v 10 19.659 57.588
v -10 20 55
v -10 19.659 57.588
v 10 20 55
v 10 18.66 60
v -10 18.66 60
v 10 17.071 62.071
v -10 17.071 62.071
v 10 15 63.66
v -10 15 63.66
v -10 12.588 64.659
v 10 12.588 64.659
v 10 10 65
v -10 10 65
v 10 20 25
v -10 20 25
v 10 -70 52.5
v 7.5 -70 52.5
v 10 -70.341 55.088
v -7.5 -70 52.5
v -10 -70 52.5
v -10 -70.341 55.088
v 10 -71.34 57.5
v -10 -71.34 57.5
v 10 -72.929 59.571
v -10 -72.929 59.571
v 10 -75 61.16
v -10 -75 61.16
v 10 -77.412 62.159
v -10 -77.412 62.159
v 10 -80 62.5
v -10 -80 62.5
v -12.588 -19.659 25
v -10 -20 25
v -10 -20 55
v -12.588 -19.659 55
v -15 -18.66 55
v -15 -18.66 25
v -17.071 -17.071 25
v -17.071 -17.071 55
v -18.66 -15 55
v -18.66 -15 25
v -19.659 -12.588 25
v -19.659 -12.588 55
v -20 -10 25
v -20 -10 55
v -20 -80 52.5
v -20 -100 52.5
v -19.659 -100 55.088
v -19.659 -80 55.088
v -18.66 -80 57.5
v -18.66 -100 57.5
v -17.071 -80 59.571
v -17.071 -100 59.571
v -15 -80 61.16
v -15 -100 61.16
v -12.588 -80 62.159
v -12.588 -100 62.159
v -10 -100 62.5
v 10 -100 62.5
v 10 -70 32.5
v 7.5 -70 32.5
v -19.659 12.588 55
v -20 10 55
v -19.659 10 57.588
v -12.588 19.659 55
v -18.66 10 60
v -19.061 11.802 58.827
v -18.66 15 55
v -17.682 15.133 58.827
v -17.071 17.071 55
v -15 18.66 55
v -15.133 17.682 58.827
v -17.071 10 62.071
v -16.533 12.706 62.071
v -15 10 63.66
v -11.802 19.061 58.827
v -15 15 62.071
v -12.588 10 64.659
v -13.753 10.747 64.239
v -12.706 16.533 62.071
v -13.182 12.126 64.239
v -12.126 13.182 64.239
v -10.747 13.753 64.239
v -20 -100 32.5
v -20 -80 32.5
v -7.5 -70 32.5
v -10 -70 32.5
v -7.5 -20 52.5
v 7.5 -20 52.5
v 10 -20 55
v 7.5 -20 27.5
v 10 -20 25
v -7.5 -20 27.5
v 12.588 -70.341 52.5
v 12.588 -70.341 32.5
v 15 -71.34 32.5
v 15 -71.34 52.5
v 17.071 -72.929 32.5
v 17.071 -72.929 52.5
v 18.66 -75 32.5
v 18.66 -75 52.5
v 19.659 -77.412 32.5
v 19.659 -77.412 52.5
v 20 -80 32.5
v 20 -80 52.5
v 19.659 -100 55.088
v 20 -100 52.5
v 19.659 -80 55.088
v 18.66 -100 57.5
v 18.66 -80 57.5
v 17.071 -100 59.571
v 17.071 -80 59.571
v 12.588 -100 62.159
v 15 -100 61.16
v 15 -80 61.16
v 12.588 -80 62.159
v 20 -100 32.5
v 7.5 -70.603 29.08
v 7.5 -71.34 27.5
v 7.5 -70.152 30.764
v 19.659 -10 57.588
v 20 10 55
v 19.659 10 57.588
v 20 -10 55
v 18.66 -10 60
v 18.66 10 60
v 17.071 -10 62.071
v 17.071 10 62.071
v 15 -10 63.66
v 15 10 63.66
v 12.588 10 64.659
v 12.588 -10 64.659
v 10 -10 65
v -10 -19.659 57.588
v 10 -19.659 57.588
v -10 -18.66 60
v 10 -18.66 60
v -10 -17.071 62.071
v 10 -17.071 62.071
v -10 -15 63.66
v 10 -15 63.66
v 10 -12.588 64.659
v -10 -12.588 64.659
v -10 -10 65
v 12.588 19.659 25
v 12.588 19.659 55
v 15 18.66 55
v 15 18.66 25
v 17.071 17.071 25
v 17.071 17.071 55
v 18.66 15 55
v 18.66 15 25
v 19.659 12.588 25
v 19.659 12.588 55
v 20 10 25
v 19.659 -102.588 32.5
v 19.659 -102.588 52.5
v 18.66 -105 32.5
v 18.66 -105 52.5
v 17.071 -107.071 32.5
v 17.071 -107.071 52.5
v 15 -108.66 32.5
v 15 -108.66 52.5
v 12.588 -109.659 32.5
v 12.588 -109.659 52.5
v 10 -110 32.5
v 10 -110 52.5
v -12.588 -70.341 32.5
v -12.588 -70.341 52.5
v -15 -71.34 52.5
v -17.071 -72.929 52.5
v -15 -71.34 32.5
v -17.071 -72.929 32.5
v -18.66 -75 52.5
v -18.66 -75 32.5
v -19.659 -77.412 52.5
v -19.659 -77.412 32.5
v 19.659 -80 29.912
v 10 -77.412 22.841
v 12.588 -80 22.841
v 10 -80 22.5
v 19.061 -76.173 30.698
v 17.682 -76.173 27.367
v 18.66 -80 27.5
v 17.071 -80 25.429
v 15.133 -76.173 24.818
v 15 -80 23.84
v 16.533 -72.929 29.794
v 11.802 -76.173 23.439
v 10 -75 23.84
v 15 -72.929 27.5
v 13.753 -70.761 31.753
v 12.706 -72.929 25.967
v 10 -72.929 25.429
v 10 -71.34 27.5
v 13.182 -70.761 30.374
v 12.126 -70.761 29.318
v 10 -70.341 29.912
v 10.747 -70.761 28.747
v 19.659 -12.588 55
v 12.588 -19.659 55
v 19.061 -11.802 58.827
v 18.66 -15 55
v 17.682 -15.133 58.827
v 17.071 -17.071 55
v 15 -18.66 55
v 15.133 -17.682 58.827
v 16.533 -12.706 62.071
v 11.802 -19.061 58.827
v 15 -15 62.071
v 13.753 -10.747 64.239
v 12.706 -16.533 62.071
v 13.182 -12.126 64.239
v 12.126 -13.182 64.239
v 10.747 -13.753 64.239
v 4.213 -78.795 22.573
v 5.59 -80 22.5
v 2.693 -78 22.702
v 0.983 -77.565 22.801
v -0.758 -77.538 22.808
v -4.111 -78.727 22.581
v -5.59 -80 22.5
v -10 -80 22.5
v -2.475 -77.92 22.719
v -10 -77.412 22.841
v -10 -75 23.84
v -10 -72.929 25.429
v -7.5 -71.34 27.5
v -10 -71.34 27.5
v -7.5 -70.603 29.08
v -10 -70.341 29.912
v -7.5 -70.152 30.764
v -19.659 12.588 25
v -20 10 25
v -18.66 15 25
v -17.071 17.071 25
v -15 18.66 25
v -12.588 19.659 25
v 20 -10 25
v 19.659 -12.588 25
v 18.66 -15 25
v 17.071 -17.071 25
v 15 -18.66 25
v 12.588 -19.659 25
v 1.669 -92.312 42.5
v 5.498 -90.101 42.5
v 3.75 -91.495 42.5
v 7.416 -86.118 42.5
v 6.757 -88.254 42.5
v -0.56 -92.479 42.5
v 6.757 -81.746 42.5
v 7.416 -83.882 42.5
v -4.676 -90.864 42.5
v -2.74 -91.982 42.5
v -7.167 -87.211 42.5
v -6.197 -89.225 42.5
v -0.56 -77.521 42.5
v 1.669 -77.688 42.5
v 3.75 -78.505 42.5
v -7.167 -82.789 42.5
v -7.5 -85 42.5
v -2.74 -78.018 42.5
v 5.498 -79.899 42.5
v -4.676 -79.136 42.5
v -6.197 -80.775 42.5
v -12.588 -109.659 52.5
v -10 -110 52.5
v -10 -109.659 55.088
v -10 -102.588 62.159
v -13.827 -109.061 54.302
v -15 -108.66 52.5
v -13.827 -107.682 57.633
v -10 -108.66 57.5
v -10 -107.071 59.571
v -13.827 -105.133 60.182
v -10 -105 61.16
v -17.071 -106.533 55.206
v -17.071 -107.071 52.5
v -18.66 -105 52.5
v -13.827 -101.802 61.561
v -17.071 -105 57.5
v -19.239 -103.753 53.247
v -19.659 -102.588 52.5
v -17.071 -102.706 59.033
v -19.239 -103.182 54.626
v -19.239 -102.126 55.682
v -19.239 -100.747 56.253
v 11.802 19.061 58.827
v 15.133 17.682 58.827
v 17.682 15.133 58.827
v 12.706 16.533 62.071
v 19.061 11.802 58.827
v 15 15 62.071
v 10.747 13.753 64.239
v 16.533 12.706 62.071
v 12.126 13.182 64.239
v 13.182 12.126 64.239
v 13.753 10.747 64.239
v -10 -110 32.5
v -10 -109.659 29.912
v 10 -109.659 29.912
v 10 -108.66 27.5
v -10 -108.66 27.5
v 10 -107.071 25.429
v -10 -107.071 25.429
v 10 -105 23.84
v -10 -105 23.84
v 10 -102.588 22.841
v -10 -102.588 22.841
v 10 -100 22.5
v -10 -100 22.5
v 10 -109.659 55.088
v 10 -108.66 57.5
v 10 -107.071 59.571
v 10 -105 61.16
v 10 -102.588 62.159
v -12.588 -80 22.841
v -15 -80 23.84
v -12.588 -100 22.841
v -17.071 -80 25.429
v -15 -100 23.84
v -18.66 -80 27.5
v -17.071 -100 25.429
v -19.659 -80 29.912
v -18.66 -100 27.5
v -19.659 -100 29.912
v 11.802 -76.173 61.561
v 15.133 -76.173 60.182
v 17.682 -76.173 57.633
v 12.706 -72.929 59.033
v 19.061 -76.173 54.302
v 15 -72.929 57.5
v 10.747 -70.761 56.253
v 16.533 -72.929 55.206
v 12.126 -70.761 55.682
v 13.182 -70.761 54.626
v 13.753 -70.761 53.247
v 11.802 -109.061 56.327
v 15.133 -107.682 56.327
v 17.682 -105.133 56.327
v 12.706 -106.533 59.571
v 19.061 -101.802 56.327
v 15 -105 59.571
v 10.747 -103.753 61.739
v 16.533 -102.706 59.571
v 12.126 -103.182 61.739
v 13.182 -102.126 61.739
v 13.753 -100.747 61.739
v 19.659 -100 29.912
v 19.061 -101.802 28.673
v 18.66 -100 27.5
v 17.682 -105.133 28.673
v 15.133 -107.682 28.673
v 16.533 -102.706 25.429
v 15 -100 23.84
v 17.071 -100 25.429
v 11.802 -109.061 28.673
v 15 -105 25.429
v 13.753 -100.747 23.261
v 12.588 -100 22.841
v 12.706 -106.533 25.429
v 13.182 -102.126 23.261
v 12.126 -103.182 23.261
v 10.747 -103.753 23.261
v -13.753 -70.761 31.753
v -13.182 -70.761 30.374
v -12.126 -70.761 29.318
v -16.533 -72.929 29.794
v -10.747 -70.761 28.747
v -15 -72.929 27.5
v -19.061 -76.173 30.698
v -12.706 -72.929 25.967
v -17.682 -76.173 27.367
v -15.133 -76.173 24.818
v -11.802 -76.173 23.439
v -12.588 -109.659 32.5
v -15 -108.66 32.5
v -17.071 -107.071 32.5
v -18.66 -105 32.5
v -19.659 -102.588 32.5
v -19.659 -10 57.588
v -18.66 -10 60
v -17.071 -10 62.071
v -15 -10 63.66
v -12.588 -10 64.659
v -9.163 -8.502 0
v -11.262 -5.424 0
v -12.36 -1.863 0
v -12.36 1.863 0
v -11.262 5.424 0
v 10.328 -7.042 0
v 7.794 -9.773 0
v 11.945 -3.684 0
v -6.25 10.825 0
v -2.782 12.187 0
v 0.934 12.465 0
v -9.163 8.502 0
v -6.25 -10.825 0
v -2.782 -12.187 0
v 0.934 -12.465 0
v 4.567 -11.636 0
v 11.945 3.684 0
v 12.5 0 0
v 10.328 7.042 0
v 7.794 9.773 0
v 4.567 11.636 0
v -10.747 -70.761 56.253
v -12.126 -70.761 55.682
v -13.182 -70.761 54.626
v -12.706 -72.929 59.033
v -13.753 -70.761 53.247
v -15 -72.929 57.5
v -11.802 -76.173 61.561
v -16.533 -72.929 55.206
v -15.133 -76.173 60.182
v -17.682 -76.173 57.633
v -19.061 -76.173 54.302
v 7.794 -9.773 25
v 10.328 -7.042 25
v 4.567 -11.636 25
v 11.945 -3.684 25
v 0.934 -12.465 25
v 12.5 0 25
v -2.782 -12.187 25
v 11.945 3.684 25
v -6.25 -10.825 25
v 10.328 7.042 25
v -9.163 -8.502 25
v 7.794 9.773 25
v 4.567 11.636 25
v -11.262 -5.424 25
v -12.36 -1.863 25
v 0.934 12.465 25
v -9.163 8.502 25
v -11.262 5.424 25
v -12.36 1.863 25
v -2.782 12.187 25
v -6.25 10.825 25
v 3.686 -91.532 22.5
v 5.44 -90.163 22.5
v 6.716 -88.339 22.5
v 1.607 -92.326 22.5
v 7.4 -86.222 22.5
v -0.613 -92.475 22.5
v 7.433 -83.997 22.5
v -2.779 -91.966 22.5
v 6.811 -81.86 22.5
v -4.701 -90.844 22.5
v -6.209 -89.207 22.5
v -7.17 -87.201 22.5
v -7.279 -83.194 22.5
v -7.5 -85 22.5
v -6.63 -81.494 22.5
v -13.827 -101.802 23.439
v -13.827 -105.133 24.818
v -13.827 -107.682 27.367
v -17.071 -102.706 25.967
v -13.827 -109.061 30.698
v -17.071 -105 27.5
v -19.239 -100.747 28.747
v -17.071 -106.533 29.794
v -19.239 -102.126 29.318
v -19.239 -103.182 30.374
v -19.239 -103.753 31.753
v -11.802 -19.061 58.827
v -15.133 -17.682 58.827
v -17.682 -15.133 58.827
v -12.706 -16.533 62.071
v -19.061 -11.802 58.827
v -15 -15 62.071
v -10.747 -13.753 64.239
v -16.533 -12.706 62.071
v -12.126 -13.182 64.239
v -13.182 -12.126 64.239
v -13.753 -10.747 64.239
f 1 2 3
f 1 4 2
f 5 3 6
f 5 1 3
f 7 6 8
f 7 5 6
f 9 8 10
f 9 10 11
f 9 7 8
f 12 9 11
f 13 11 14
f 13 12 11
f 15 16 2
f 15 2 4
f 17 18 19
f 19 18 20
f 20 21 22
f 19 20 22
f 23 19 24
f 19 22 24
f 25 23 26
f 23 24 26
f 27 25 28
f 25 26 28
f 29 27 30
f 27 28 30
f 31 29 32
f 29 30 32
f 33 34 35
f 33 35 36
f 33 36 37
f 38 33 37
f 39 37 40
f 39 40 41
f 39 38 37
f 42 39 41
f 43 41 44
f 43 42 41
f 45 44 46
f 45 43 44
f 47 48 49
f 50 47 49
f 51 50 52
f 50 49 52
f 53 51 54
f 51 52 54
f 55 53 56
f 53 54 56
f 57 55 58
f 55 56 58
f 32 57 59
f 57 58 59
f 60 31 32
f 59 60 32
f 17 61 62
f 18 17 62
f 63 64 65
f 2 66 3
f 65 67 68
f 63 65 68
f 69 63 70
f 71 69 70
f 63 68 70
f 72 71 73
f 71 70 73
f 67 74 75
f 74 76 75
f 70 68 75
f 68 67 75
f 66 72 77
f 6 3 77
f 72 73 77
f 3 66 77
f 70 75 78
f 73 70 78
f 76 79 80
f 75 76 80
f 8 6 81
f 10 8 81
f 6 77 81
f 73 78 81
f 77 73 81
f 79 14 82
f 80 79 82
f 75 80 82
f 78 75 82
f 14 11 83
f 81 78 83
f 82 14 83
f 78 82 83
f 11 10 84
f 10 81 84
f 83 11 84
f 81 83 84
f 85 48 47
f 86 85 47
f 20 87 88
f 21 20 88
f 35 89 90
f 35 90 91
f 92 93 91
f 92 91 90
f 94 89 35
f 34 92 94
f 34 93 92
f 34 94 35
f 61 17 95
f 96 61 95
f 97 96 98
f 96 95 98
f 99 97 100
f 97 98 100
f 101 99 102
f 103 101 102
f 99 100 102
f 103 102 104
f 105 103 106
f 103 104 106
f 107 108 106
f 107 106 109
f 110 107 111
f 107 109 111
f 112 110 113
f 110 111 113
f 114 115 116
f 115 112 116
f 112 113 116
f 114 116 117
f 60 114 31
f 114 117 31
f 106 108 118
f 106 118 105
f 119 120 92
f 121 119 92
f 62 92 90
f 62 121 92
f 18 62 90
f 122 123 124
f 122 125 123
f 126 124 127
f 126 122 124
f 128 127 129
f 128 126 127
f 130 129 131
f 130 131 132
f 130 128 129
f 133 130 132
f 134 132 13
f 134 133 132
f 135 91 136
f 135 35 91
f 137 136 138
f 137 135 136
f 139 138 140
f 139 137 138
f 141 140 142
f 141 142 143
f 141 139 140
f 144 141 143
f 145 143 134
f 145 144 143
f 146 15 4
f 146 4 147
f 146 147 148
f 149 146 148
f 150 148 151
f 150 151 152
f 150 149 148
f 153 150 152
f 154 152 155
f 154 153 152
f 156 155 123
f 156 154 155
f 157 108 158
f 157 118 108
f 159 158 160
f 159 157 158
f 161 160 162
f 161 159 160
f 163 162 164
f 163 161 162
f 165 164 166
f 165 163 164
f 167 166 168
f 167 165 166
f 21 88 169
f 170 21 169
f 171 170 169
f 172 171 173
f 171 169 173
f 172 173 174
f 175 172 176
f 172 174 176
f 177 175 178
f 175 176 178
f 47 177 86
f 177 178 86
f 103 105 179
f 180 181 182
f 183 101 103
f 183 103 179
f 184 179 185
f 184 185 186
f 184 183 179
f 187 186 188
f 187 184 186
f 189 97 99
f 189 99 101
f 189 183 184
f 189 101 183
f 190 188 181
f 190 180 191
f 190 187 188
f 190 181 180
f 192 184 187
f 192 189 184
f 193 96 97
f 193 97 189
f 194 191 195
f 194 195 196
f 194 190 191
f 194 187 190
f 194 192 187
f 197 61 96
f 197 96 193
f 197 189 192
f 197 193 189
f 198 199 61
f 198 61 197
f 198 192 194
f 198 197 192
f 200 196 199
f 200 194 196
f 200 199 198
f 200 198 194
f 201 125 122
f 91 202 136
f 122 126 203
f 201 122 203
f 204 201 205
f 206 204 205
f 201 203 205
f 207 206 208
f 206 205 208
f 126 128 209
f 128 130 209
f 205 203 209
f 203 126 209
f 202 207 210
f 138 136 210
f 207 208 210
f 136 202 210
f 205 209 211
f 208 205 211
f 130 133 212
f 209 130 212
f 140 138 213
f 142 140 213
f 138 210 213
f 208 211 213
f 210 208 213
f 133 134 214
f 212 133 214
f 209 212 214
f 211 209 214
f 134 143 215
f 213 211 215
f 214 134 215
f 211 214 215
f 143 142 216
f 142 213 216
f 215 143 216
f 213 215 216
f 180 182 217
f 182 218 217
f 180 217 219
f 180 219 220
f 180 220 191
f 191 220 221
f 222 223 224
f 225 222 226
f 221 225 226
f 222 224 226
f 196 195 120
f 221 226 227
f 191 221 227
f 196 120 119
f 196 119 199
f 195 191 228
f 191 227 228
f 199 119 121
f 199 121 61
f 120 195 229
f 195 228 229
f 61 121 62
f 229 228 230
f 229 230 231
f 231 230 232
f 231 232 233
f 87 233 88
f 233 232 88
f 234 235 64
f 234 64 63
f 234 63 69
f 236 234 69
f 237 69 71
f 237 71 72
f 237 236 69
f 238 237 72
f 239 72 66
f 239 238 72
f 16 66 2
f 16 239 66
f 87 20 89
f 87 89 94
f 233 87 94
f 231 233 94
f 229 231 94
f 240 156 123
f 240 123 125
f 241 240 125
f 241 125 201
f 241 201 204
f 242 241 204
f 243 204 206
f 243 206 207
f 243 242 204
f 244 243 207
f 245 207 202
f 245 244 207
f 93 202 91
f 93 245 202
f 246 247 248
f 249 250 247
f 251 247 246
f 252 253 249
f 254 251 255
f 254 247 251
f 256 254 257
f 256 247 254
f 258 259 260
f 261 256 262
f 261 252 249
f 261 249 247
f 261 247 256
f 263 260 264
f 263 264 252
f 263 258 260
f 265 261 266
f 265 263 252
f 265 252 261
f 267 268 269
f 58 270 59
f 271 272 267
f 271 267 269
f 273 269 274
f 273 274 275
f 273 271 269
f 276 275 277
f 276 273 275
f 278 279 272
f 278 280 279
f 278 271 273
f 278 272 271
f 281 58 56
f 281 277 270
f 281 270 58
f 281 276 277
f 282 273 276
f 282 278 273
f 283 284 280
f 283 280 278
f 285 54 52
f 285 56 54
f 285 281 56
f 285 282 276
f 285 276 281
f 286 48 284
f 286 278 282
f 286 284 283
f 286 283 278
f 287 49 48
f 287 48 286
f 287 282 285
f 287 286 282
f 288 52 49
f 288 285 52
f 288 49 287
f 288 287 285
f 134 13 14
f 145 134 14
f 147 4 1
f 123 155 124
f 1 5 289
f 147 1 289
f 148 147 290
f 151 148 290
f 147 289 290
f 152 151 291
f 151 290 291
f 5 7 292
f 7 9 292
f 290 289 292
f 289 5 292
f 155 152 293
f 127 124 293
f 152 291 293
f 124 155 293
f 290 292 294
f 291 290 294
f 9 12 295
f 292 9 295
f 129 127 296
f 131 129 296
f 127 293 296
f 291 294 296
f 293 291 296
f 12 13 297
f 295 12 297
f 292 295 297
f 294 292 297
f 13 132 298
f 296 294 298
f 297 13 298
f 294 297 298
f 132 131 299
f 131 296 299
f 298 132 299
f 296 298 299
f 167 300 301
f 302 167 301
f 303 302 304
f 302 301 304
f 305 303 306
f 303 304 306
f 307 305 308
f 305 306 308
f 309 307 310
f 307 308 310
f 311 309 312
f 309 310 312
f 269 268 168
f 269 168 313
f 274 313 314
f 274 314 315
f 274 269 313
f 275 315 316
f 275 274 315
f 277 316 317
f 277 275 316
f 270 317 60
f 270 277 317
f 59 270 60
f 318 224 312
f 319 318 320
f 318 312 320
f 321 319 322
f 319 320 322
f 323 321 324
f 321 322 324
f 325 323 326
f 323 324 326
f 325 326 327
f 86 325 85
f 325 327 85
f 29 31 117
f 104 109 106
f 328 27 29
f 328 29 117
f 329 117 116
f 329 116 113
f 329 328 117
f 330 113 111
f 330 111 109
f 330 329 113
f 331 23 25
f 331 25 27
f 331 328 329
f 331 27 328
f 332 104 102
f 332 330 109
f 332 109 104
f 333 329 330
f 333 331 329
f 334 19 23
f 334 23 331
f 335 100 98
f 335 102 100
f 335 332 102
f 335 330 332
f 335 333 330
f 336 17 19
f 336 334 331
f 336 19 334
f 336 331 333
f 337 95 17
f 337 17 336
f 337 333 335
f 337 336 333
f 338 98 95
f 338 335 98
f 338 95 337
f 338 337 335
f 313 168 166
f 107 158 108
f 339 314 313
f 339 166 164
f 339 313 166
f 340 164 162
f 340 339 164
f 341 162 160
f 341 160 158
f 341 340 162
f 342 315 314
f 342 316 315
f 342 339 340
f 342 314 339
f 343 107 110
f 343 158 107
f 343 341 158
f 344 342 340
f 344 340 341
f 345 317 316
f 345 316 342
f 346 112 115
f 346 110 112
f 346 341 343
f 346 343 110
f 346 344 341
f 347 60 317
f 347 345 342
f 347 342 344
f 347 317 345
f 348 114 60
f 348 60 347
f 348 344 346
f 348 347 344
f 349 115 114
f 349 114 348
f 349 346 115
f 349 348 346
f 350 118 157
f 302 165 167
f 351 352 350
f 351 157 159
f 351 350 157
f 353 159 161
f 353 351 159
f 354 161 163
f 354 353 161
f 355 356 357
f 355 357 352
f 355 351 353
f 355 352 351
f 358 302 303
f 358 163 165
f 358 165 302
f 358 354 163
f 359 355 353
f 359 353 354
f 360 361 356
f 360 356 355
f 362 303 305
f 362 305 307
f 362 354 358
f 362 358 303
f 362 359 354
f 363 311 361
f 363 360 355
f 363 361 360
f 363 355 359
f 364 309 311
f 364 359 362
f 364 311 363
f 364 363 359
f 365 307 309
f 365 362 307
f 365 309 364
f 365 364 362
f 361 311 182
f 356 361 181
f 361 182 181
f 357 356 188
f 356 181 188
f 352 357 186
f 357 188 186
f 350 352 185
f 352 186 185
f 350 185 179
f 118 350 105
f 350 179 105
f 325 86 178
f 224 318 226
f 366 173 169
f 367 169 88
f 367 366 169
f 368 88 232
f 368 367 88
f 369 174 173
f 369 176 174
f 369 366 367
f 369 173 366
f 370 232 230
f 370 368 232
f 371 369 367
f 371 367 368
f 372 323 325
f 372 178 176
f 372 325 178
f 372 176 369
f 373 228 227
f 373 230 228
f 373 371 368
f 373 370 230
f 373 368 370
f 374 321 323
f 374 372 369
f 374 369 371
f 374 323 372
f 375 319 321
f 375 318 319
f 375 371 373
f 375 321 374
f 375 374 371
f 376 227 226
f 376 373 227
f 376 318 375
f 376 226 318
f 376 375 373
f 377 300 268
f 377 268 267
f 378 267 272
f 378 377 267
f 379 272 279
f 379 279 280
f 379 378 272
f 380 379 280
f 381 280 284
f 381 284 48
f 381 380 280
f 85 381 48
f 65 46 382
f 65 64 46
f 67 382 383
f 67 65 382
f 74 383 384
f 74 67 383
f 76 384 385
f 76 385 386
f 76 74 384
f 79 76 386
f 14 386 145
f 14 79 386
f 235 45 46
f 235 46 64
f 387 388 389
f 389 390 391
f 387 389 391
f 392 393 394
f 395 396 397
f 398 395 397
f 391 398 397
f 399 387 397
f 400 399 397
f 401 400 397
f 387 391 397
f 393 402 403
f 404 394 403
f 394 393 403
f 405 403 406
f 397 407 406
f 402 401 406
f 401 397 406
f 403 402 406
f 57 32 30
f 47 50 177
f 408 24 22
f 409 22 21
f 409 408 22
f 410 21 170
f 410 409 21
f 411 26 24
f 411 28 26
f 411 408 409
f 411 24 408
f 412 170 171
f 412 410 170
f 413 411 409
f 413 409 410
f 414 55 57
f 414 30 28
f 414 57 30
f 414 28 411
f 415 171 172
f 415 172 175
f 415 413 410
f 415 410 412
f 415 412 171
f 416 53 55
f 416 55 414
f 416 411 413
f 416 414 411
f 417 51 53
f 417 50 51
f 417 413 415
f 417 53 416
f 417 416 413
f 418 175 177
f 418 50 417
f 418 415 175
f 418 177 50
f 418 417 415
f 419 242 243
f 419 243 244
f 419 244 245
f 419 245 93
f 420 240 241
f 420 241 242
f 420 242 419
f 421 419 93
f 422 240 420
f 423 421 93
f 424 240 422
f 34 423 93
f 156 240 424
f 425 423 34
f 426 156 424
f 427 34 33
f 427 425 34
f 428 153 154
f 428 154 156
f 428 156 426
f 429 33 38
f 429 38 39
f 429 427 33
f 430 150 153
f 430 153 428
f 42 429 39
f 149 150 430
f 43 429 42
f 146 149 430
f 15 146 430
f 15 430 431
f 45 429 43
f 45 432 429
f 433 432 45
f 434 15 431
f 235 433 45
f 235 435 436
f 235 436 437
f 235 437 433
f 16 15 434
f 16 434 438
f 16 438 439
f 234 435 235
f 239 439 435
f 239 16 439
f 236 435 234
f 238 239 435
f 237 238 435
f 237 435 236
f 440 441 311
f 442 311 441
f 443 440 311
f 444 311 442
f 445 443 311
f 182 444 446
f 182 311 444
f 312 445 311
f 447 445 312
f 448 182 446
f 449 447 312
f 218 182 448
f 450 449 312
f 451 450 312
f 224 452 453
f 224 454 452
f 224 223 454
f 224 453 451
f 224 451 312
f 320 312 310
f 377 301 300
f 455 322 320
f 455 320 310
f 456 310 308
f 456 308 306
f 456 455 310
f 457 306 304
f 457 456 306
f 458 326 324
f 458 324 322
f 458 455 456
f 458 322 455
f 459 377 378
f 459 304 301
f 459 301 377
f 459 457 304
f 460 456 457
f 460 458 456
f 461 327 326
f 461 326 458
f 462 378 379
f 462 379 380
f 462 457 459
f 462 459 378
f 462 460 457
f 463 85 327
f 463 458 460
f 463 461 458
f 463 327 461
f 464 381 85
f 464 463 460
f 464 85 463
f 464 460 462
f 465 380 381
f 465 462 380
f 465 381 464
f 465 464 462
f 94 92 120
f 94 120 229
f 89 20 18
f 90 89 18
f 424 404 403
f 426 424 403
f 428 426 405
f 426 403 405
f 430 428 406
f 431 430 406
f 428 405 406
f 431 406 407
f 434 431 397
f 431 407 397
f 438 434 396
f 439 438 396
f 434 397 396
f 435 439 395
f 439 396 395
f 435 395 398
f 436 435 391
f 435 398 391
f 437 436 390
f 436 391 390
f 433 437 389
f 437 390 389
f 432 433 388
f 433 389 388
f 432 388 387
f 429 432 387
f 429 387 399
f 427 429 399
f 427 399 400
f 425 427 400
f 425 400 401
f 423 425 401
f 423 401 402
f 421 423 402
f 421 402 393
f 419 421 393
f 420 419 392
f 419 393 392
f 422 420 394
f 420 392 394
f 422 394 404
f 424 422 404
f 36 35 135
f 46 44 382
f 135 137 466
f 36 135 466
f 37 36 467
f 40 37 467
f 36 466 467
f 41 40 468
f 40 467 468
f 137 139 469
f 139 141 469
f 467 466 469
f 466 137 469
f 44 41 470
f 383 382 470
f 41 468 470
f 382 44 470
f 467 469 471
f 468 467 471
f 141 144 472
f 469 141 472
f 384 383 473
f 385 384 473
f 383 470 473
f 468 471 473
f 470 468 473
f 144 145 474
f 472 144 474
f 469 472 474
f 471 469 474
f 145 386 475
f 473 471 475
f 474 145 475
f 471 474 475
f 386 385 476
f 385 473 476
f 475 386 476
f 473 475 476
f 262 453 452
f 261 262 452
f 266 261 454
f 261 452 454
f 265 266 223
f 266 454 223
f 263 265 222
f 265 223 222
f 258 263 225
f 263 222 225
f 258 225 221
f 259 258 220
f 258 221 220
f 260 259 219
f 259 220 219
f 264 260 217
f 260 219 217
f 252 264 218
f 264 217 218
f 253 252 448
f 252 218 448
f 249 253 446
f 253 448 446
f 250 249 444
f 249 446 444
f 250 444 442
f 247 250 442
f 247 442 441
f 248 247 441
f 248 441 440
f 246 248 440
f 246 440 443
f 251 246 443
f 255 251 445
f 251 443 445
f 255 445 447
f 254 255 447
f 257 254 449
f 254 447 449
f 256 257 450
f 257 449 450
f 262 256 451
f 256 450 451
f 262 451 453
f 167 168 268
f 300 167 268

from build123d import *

# Parameters (mm, degrees)
ESQUISSE1_R             = 12.5
BOSS_EXTRU_1_DEPTH      = 25
BOSS_EXTRU_2_DEPTH      = 40
CONG_1_R                = 10
ESQUISSE5_W             = 15
ESQUISSE5_H             = 25
BOSS_EXTRU_3_DEPTH      = 50
BOSS_EXTRU_4_DEPTH      = 5
BOSS_EXTRU_4_DEPTH_BACK = 35
ESQUISSE6_W             = 40
ESQUISSE6_H             = 40
CONG_2_R                = 10
CONG_3_R                = 10
ESQUISSE8_R             = 7.5
ENL_V_MAT_EXTRU_2_DEPTH = 20
CONG_4_R                = 10


with BuildPart() as part:
    # Esquisse1 → Boss.-Extru.1 (new body)
    with BuildSketch(Plane.XY):
        Circle(ESQUISSE1_R)
    extrude(amount=BOSS_EXTRU_1_DEPTH)

    # Esquisse2 → Boss.-Extru.2 (add)
    with BuildSketch(Plane.XY.offset(25)):
        with BuildLine():
            Line((-10, 20), (10, 20))
            ThreePointArc((10, 20), (17.071067812, 17.071067812), (20, 10))
            Line((20, 10), (20, -10))
            ThreePointArc((20, -10), (17.071067812, -17.071067812), (10, -20))
            Line((10, -20), (-10, -20))
            ThreePointArc((-10, -20), (-17.071067812, -17.071067812), (-20, -10))
            Line((-20, -10), (-20, 10))
            ThreePointArc((-20, 10), (-17.071067812, 17.071067812), (-10, 20))
        make_face()
    extrude(amount=BOSS_EXTRU_2_DEPTH)

    # Congé1
    cong_1_edges = [part.edges().sort_by_distance(p)[0] for p in [
        (0, 20, 65),
        (-17.071067812, 17.071067812, 65),
        (-20, 0, 65),
        (-17.071067812, -17.071067812, 65),
        (0, -20, 65),
        (17.071067812, -17.071067812, 65),
        (20, 0, 65),
        (17.071067812, 17.071067812, 65),
    ]]
    fillet(cong_1_edges, radius=CONG_1_R)

    # Esquisse5 → Boss.-Extru.3 (add)
    with BuildSketch(Plane.XZ.offset(20)):
        with Locations((0, 40)):
            Rectangle(ESQUISSE5_W, ESQUISSE5_H)
    extrude(amount=BOSS_EXTRU_3_DEPTH)

    # Esquisse6 → Boss.-Extru.4 (add, two sides: drawn at the far end of the back side and taken through both)
    with BuildSketch(Plane(origin=(0, 0, 27.5), x_dir=(-1, 0, 0), z_dir=(0, 0, -1)).offset(-BOSS_EXTRU_4_DEPTH_BACK)):
        with Locations((0, -90)):
            Rectangle(ESQUISSE6_W, ESQUISSE6_H)
    extrude(amount=BOSS_EXTRU_4_DEPTH + BOSS_EXTRU_4_DEPTH_BACK)

    # Congé2
    cong_2_edges = [part.edges().sort_by_distance(p)[0] for p in [
        (-20, -110, 42.5),
        (0, -110, 62.5),
        (20, -110, 42.5),
        (0, -110, 22.5),
    ]]
    fillet(cong_2_edges, radius=CONG_2_R)

    # Congé3
    # the kernel refuses this fillet: 10 mm, written as the material it takes off along each edge
    with BuildSketch(Plane(origin=(10, -100, 32.5), x_dir=(1, 0, 0), z_dir=(0, 0, -1))) as cong_3_piece_1_section:
        Polygon((0, 0), (CONG_3_R, 0), (CONG_3_R, CONG_3_R), (0, CONG_3_R), align=None)
    cong_3_piece_1 = extrude(amount=CONG_3_R, mode=Mode.PRIVATE)
    cong_3_piece_1 = cong_3_piece_1 - Plane(origin=(10, -100, 32.5), x_dir=(-0.7071067811865475, 0.7071067811865475, 0), z_dir=(0, 0, -1)) * Sphere(CONG_3_R, mode=Mode.PRIVATE)
    add(cong_3_piece_1, mode=Mode.SUBTRACT)
    with BuildSketch(Plane(origin=(-10, -100, 32.5), x_dir=(0, 0, -1), z_dir=(-1, 0, 0))) as cong_3_piece_2_section:
        Polygon((0, 0), (CONG_3_R, 0), (CONG_3_R, CONG_3_R), (0, CONG_3_R), align=None)
    cong_3_piece_2 = extrude(amount=CONG_3_R, mode=Mode.PRIVATE)
    cong_3_piece_2 = cong_3_piece_2 - Plane(origin=(-10, -100, 32.5), x_dir=(0, 0.7071067811865475, 0.7071067811865475), z_dir=(-1, 0, 0)) * Sphere(CONG_3_R, mode=Mode.PRIVATE)
    add(cong_3_piece_2, mode=Mode.SUBTRACT)
    with BuildSketch(Plane(origin=(10, -100, 52.5), x_dir=(1, 0, 0), z_dir=(0, 0, 1))) as cong_3_piece_3_section:
        Polygon((0, 0), (CONG_3_R, 0), (CONG_3_R, -CONG_3_R), (0, -CONG_3_R), align=None)
    cong_3_piece_3 = extrude(amount=CONG_3_R, mode=Mode.PRIVATE)
    cong_3_piece_3 = cong_3_piece_3 - Plane(origin=(10, -100, 52.5), x_dir=(-0.7071067811865475, 0.7071067811865475, 0), z_dir=(0, 0, 1)) * Sphere(CONG_3_R, mode=Mode.PRIVATE)
    add(cong_3_piece_3, mode=Mode.SUBTRACT)
    with BuildSketch(Plane(origin=(-10, -100, 52.5), x_dir=(0, 0, 1), z_dir=(-1, 0, 0))) as cong_3_piece_4_section:
        Polygon((0, 0), (CONG_3_R, 0), (CONG_3_R, -CONG_3_R), (0, -CONG_3_R), align=None)
    cong_3_piece_4 = extrude(amount=CONG_3_R, mode=Mode.PRIVATE)
    cong_3_piece_4 = cong_3_piece_4 - Plane(origin=(-10, -100, 52.5), x_dir=(0, 0.7071067811865475, -0.7071067811865475), z_dir=(-1, 0, 0)) * Sphere(CONG_3_R, mode=Mode.PRIVATE)
    add(cong_3_piece_4, mode=Mode.SUBTRACT)
    with BuildSketch(Plane(origin=(20, -45, 62.5), x_dir=(-1, 0, 0), z_dir=(0, -1, 0)), Plane(origin=(-20, -100, 22.5), x_dir=(0, 0, 1), z_dir=(0, 1, 0))) as cong_3_piece_5:
        with BuildLine():
            CenterArc((CONG_3_R, CONG_3_R), CONG_3_R, 180, 90)
            Line((0, CONG_3_R), (0, 0))
            Line((0, 0), (CONG_3_R, 0))
        make_face()
    extrude(amount=55, mode=Mode.SUBTRACT)
    with BuildSketch(Plane(origin=(20, -45, 22.5), x_dir=(-1, 0, 0), z_dir=(0, -1, 0)), Plane(origin=(-20, -100, 62.5), x_dir=(0, 0, -1), z_dir=(0, 1, 0))) as cong_3_piece_6:
        with BuildLine():
            CenterArc((CONG_3_R, -CONG_3_R), CONG_3_R, 90, 90)
            Line((0, -CONG_3_R), (0, 0))
            Line((0, 0), (CONG_3_R, 0))
        make_face()
    extrude(amount=55, mode=Mode.SUBTRACT)

    # Esquisse8 → Enlèv. mat.-Extru.2 (cut)
    with BuildSketch(Plane(origin=(0, 0, 22.5), x_dir=(-1, 0, 0), z_dir=(0, 0, -1))):
        with Locations((0, -85)):
            Circle(ESQUISSE8_R)
    extrude(amount=-ENL_V_MAT_EXTRU_2_DEPTH, mode=Mode.SUBTRACT)

    # Congé4
    # the kernel refuses this fillet: 10 mm, written as the material it takes off along each edge
    with BuildSketch(Plane(origin=(-10, -70, 52.5), x_dir=(0, 0, 1), z_dir=(1, 0, 0))) as cong_4_piece_1:
        with BuildLine():
            CenterArc((10 - CONG_4_R, CONG_4_R), CONG_4_R, 270, 90)
            Line((10 - CONG_4_R, 0), (10, 0))
            Line((10, 0), (10, CONG_4_R))
        make_face()
    revolve(axis=Axis((-10, -70, 52.5), (0, -1, 0)), revolution_arc=90, mode=Mode.SUBTRACT)
    with BuildSketch(Plane(origin=(-10, -70, 62.5), x_dir=(0, 0, -1), z_dir=(1, 0, 0)), Plane(origin=(20, -70, 52.5), x_dir=(-1, 0, 0), z_dir=(0, 0, -1))) as cong_4_piece_2:
        with BuildLine():
            CenterArc((CONG_4_R, -CONG_4_R), CONG_4_R, 90, 90)
            Line((0, -CONG_4_R), (0, 0))
            Line((0, 0), (CONG_4_R, 0))
        make_face()
    extrude(amount=20, mode=Mode.SUBTRACT)
    with BuildSketch(Plane(origin=(10, -70, 52.5), x_dir=(0, 0, 1), z_dir=(-1, 0, 0))) as cong_4_piece_3:
        with BuildLine():
            CenterArc((10 - CONG_4_R, -CONG_4_R), CONG_4_R, 0, 90)
            Line((10, -CONG_4_R), (10, 0))
            Line((10, 0), (10 - CONG_4_R, 0))
        make_face()
    revolve(axis=Axis((10, -70, 52.5), (0, 1, 0)), revolution_arc=90, mode=Mode.SUBTRACT)
    with BuildSketch(Plane(origin=(10, -70, 32.5), x_dir=(1, 0, 0), z_dir=(0, 0, 1))) as cong_4_piece_4:
        with BuildLine():
            CenterArc((10 - CONG_4_R, -CONG_4_R), CONG_4_R, 0, 90)
            Line((10, -CONG_4_R), (10, 0))
            Line((10, 0), (10 - CONG_4_R, 0))
        make_face()
    revolve(axis=Axis((10, -70, 32.5), (0, 1, 0)), revolution_arc=90, mode=Mode.SUBTRACT)
    with BuildSketch(Plane(origin=(-10, -70, 22.5), x_dir=(0, 0, 1), z_dir=(1, 0, 0))) as cong_4_piece_5_section:
        with BuildLine():
            CenterArc((CONG_4_R, CONG_4_R), CONG_4_R, 180, 90)
            Line((0, CONG_4_R), (0, 0))
            Line((0, 0), (CONG_4_R, 0))
        make_face()
    cong_4_piece_5 = extrude(amount=20, mode=Mode.PRIVATE)
    cong_4_piece_5 = split(cong_4_piece_5, bisect_by=Plane(origin=(-8.75, -70.240083817, 27.5), z_dir=(0, 0, 1)), keep=Keep.TOP, mode=Mode.PRIVATE)
    cong_4_piece_5 = split(cong_4_piece_5, bisect_by=Plane(origin=(-7.5, -70.240083817, 29.132507845), z_dir=(-1, 0, 0)), keep=Keep.TOP, mode=Mode.PRIVATE)
    add(cong_4_piece_5, mode=Mode.SUBTRACT)
    with BuildSketch(Plane(origin=(-10, -70, 22.5), x_dir=(0, 0, 1), z_dir=(1, 0, 0))) as cong_4_piece_6_section:
        with BuildLine():
            CenterArc((CONG_4_R, CONG_4_R), CONG_4_R, 180, 90)
            Line((0, CONG_4_R), (0, 0))
            Line((0, 0), (CONG_4_R, 0))
        make_face()
    cong_4_piece_6 = extrude(amount=20, mode=Mode.PRIVATE)
    cong_4_piece_6 = split(cong_4_piece_6, bisect_by=Plane(origin=(-8.75, -72.5512006, 27.5), z_dir=(0, 0, -1)), keep=Keep.TOP, mode=Mode.PRIVATE)
    cong_4_piece_6 = split(cong_4_piece_6, bisect_by=Plane(origin=(-7.5, -72.5512006, 24.143917643), z_dir=(-1, 0, 0)), keep=Keep.TOP, mode=Mode.PRIVATE)
    add(cong_4_piece_6, mode=Mode.SUBTRACT)
    with BuildSketch(Plane(origin=(-10, -70, 22.5), x_dir=(0, 0, 1), z_dir=(1, 0, 0))) as cong_4_piece_7_section:
        with BuildLine():
            CenterArc((CONG_4_R, CONG_4_R), CONG_4_R, 180, 90)
            Line((0, CONG_4_R), (0, 0))
            Line((0, 0), (CONG_4_R, 0))
        make_face()
    cong_4_piece_7 = extrude(amount=20, mode=Mode.PRIVATE)
    cong_4_piece_7 = split(cong_4_piece_7, bisect_by=Plane(origin=(0, -72.5512006, 27.5), z_dir=(0, 0, -1)), keep=Keep.TOP, mode=Mode.PRIVATE)
    cong_4_piece_7 = split(cong_4_piece_7, bisect_by=Plane(origin=(7.5, -72.5512006, 24.143917643), z_dir=(-1, 0, 0)), keep=Keep.TOP, mode=Mode.PRIVATE)
    cong_4_piece_7 = split(cong_4_piece_7, bisect_by=Plane(origin=(-7.5, -72.5512006, 24.143917643), z_dir=(1, 0, 0)), keep=Keep.TOP, mode=Mode.PRIVATE)
    add(cong_4_piece_7, mode=Mode.SUBTRACT)
    with BuildSketch(Plane(origin=(-10, -70, 22.5), x_dir=(0, 0, 1), z_dir=(1, 0, 0))) as cong_4_piece_8_section:
        with BuildLine():
            CenterArc((CONG_4_R, CONG_4_R), CONG_4_R, 180, 90)
            Line((0, CONG_4_R), (0, 0))
            Line((0, 0), (CONG_4_R, 0))
        make_face()
    cong_4_piece_8 = extrude(amount=20, mode=Mode.PRIVATE)
    cong_4_piece_8 = split(cong_4_piece_8, bisect_by=Plane(origin=(8.75, -70.240083817, 27.5), z_dir=(0, 0, 1)), keep=Keep.TOP, mode=Mode.PRIVATE)
    cong_4_piece_8 = split(cong_4_piece_8, bisect_by=Plane(origin=(7.5, -70.240083817, 29.132507845), z_dir=(1, 0, 0)), keep=Keep.TOP, mode=Mode.PRIVATE)
    add(cong_4_piece_8, mode=Mode.SUBTRACT)
    with BuildSketch(Plane(origin=(-10, -70, 22.5), x_dir=(0, 0, 1), z_dir=(1, 0, 0))) as cong_4_piece_9_section:
        with BuildLine():
            CenterArc((CONG_4_R, CONG_4_R), CONG_4_R, 180, 90)
            Line((0, CONG_4_R), (0, 0))
            Line((0, 0), (CONG_4_R, 0))
        make_face()
    cong_4_piece_9 = extrude(amount=20, mode=Mode.PRIVATE)
    cong_4_piece_9 = split(cong_4_piece_9, bisect_by=Plane(origin=(8.75, -72.5512006, 27.5), z_dir=(0, 0, -1)), keep=Keep.TOP, mode=Mode.PRIVATE)
    cong_4_piece_9 = split(cong_4_piece_9, bisect_by=Plane(origin=(7.5, -72.5512006, 24.143917643), z_dir=(1, 0, 0)), keep=Keep.TOP, mode=Mode.PRIVATE)
    add(cong_4_piece_9, mode=Mode.SUBTRACT)
    with BuildSketch(Plane(origin=(-10, -70, 32.5), x_dir=(-1, 0, 0), z_dir=(0, 0, 1))) as cong_4_piece_10:
        with BuildLine():
            CenterArc((10 - CONG_4_R, CONG_4_R), CONG_4_R, 270, 90)
            Line((10, CONG_4_R), (10, 0))
            Line((10, 0), (10 - CONG_4_R, 0))
        make_face()
    revolve(axis=Axis((-10, -70, 32.5), (0, -1, 0)), revolution_arc=90, mode=Mode.SUBTRACT)
    with BuildSketch(Plane(origin=(-20, -70, 32.5), x_dir=(0, -1, 0), z_dir=(0, 0, 1))) as cong_4_piece_11:
        with BuildLine():
            CenterArc((CONG_4_R, CONG_4_R), CONG_4_R, 180, 90)
            Line((0, CONG_4_R), (0, 0))
            Line((0, 0), (CONG_4_R, 0))
        make_face()
    extrude(amount=20, mode=Mode.SUBTRACT)


solid = part.part
